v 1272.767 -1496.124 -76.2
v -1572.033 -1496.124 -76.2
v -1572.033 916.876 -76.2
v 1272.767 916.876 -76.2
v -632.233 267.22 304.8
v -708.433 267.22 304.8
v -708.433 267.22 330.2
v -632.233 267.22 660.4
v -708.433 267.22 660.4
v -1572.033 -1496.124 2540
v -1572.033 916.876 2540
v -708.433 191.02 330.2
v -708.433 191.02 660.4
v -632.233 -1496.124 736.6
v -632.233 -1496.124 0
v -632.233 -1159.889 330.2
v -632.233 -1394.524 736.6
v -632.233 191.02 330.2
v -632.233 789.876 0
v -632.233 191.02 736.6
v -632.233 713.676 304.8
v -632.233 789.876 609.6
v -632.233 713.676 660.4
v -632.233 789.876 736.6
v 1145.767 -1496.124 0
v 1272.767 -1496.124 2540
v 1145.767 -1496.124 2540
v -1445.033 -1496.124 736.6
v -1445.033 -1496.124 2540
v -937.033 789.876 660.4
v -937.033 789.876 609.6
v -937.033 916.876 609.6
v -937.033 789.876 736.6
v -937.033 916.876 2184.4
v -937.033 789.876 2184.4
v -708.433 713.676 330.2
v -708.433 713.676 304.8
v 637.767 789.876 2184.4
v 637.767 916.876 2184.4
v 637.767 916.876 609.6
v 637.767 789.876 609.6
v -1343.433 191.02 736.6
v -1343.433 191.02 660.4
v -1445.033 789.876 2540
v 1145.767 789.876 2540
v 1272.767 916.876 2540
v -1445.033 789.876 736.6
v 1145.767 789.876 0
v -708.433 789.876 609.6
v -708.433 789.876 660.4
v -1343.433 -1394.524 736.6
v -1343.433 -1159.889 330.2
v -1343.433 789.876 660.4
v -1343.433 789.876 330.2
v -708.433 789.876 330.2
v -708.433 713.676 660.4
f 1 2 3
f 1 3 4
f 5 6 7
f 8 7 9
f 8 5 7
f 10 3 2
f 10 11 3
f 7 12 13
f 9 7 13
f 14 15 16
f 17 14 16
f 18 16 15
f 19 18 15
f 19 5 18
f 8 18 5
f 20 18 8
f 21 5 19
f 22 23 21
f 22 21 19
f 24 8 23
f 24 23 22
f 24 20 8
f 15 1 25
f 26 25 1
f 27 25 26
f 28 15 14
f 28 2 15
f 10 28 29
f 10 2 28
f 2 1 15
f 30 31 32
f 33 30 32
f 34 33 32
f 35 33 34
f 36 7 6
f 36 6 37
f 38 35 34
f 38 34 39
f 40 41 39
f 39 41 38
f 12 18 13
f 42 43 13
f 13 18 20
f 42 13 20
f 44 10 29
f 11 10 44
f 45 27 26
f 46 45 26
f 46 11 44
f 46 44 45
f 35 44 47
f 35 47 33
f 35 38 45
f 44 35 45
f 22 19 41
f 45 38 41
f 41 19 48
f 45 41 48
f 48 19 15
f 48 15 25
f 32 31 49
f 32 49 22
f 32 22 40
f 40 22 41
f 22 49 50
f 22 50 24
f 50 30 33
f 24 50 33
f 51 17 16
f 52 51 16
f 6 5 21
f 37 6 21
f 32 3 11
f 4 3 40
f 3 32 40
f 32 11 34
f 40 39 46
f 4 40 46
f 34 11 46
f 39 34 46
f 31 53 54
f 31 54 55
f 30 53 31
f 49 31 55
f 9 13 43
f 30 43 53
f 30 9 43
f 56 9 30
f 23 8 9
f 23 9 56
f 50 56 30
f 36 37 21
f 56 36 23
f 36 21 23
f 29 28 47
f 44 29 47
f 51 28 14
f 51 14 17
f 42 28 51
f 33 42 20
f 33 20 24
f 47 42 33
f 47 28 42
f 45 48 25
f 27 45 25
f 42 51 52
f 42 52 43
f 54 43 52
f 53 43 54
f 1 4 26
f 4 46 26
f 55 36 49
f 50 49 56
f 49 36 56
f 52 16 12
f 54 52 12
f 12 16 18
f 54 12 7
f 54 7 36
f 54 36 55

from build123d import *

# Parameters (mm, degrees)
F1_DEPTH  = 2540
F2_W      = 2844.8
F2_H      = 2413
F3_DEPTH  = 76.2
F4_W      = 1574.8
F4_H      = 1574.8
F5_DEPTH  = 127.001
F6_W      = 2286
F6_H      = 736.6
F7_DEPTH  = 812.8
F9_DEPTH  = 711.2
F10_W     = 635
F10_H     = 330.2
F11_DEPTH = 598.856606
F12_W     = 446.456606
F12_H     = 355.6
F13_DEPTH = 76.2


with BuildPart() as f1:
    # F0 (on Top) → F1 (new body)
    with BuildSketch(Plane.XY):
        Polygon((-1445.033048, -1496.123811), (-1445.033048, 789.876189), (1145.766952, 789.876189), (1145.766952, -1496.123811), (1272.766952, -1496.123811), (1272.766952, 916.876189), (-1572.033048, 916.876189), (-1572.033048, -1496.123811), align=None)
    extrude(amount=F1_DEPTH)

    # F2 (on face) → F3 (join)
    with BuildSketch(Plane(origin=(0, 0, 0), x_dir=(1, 0, 0), z_dir=(0, 0, -1))):
        with Locations((-149.633048, 289.623811)):
            Rectangle(F2_W, F2_H)
    extrude(amount=F3_DEPTH)

    # F4 (on face) → F5 (cut, through all)
    with BuildSketch(Plane.XZ.offset(-789.876189)):
        with Locations((-149.633048, 1397)):
            Rectangle(F4_W, F4_H)
    extrude(amount=-F5_DEPTH, mode=Mode.SUBTRACT)

    # F6 (on face) → F7 (join)
    with BuildSketch(Plane.YZ.offset(-1445.033048)):
        with Locations((-353.123811, 368.3)):
            Rectangle(F6_W, F6_H)
    extrude(amount=F7_DEPTH)

    # F8 (on face) → F9 (cut)
    with BuildSketch(Plane.YZ.offset(-632.233048)):
        Polygon((191.019583, 736.6), (-1394.523811, 736.6), (-1159.888661, 330.2), (191.019583, 330.2), align=None)
    extrude(amount=-F9_DEPTH, mode=Mode.SUBTRACT)

    # F10 (on face) → F11 (cut, through all)
    with BuildSketch(Plane.XZ.offset(-191.019583)):
        with Locations((-1025.933048, 495.3)):
            Rectangle(F10_W, F10_H)
    extrude(amount=-F11_DEPTH, mode=Mode.SUBTRACT)

    # F12 (on face) → F13 (cut, through all)
    with BuildSketch(Plane.YZ.offset(-632.233048)):
        with Locations((490.447886, 482.6)):
            Rectangle(F12_W, F12_H)
    extrude(amount=-F13_DEPTH, mode=Mode.SUBTRACT)


solid = f1.part
